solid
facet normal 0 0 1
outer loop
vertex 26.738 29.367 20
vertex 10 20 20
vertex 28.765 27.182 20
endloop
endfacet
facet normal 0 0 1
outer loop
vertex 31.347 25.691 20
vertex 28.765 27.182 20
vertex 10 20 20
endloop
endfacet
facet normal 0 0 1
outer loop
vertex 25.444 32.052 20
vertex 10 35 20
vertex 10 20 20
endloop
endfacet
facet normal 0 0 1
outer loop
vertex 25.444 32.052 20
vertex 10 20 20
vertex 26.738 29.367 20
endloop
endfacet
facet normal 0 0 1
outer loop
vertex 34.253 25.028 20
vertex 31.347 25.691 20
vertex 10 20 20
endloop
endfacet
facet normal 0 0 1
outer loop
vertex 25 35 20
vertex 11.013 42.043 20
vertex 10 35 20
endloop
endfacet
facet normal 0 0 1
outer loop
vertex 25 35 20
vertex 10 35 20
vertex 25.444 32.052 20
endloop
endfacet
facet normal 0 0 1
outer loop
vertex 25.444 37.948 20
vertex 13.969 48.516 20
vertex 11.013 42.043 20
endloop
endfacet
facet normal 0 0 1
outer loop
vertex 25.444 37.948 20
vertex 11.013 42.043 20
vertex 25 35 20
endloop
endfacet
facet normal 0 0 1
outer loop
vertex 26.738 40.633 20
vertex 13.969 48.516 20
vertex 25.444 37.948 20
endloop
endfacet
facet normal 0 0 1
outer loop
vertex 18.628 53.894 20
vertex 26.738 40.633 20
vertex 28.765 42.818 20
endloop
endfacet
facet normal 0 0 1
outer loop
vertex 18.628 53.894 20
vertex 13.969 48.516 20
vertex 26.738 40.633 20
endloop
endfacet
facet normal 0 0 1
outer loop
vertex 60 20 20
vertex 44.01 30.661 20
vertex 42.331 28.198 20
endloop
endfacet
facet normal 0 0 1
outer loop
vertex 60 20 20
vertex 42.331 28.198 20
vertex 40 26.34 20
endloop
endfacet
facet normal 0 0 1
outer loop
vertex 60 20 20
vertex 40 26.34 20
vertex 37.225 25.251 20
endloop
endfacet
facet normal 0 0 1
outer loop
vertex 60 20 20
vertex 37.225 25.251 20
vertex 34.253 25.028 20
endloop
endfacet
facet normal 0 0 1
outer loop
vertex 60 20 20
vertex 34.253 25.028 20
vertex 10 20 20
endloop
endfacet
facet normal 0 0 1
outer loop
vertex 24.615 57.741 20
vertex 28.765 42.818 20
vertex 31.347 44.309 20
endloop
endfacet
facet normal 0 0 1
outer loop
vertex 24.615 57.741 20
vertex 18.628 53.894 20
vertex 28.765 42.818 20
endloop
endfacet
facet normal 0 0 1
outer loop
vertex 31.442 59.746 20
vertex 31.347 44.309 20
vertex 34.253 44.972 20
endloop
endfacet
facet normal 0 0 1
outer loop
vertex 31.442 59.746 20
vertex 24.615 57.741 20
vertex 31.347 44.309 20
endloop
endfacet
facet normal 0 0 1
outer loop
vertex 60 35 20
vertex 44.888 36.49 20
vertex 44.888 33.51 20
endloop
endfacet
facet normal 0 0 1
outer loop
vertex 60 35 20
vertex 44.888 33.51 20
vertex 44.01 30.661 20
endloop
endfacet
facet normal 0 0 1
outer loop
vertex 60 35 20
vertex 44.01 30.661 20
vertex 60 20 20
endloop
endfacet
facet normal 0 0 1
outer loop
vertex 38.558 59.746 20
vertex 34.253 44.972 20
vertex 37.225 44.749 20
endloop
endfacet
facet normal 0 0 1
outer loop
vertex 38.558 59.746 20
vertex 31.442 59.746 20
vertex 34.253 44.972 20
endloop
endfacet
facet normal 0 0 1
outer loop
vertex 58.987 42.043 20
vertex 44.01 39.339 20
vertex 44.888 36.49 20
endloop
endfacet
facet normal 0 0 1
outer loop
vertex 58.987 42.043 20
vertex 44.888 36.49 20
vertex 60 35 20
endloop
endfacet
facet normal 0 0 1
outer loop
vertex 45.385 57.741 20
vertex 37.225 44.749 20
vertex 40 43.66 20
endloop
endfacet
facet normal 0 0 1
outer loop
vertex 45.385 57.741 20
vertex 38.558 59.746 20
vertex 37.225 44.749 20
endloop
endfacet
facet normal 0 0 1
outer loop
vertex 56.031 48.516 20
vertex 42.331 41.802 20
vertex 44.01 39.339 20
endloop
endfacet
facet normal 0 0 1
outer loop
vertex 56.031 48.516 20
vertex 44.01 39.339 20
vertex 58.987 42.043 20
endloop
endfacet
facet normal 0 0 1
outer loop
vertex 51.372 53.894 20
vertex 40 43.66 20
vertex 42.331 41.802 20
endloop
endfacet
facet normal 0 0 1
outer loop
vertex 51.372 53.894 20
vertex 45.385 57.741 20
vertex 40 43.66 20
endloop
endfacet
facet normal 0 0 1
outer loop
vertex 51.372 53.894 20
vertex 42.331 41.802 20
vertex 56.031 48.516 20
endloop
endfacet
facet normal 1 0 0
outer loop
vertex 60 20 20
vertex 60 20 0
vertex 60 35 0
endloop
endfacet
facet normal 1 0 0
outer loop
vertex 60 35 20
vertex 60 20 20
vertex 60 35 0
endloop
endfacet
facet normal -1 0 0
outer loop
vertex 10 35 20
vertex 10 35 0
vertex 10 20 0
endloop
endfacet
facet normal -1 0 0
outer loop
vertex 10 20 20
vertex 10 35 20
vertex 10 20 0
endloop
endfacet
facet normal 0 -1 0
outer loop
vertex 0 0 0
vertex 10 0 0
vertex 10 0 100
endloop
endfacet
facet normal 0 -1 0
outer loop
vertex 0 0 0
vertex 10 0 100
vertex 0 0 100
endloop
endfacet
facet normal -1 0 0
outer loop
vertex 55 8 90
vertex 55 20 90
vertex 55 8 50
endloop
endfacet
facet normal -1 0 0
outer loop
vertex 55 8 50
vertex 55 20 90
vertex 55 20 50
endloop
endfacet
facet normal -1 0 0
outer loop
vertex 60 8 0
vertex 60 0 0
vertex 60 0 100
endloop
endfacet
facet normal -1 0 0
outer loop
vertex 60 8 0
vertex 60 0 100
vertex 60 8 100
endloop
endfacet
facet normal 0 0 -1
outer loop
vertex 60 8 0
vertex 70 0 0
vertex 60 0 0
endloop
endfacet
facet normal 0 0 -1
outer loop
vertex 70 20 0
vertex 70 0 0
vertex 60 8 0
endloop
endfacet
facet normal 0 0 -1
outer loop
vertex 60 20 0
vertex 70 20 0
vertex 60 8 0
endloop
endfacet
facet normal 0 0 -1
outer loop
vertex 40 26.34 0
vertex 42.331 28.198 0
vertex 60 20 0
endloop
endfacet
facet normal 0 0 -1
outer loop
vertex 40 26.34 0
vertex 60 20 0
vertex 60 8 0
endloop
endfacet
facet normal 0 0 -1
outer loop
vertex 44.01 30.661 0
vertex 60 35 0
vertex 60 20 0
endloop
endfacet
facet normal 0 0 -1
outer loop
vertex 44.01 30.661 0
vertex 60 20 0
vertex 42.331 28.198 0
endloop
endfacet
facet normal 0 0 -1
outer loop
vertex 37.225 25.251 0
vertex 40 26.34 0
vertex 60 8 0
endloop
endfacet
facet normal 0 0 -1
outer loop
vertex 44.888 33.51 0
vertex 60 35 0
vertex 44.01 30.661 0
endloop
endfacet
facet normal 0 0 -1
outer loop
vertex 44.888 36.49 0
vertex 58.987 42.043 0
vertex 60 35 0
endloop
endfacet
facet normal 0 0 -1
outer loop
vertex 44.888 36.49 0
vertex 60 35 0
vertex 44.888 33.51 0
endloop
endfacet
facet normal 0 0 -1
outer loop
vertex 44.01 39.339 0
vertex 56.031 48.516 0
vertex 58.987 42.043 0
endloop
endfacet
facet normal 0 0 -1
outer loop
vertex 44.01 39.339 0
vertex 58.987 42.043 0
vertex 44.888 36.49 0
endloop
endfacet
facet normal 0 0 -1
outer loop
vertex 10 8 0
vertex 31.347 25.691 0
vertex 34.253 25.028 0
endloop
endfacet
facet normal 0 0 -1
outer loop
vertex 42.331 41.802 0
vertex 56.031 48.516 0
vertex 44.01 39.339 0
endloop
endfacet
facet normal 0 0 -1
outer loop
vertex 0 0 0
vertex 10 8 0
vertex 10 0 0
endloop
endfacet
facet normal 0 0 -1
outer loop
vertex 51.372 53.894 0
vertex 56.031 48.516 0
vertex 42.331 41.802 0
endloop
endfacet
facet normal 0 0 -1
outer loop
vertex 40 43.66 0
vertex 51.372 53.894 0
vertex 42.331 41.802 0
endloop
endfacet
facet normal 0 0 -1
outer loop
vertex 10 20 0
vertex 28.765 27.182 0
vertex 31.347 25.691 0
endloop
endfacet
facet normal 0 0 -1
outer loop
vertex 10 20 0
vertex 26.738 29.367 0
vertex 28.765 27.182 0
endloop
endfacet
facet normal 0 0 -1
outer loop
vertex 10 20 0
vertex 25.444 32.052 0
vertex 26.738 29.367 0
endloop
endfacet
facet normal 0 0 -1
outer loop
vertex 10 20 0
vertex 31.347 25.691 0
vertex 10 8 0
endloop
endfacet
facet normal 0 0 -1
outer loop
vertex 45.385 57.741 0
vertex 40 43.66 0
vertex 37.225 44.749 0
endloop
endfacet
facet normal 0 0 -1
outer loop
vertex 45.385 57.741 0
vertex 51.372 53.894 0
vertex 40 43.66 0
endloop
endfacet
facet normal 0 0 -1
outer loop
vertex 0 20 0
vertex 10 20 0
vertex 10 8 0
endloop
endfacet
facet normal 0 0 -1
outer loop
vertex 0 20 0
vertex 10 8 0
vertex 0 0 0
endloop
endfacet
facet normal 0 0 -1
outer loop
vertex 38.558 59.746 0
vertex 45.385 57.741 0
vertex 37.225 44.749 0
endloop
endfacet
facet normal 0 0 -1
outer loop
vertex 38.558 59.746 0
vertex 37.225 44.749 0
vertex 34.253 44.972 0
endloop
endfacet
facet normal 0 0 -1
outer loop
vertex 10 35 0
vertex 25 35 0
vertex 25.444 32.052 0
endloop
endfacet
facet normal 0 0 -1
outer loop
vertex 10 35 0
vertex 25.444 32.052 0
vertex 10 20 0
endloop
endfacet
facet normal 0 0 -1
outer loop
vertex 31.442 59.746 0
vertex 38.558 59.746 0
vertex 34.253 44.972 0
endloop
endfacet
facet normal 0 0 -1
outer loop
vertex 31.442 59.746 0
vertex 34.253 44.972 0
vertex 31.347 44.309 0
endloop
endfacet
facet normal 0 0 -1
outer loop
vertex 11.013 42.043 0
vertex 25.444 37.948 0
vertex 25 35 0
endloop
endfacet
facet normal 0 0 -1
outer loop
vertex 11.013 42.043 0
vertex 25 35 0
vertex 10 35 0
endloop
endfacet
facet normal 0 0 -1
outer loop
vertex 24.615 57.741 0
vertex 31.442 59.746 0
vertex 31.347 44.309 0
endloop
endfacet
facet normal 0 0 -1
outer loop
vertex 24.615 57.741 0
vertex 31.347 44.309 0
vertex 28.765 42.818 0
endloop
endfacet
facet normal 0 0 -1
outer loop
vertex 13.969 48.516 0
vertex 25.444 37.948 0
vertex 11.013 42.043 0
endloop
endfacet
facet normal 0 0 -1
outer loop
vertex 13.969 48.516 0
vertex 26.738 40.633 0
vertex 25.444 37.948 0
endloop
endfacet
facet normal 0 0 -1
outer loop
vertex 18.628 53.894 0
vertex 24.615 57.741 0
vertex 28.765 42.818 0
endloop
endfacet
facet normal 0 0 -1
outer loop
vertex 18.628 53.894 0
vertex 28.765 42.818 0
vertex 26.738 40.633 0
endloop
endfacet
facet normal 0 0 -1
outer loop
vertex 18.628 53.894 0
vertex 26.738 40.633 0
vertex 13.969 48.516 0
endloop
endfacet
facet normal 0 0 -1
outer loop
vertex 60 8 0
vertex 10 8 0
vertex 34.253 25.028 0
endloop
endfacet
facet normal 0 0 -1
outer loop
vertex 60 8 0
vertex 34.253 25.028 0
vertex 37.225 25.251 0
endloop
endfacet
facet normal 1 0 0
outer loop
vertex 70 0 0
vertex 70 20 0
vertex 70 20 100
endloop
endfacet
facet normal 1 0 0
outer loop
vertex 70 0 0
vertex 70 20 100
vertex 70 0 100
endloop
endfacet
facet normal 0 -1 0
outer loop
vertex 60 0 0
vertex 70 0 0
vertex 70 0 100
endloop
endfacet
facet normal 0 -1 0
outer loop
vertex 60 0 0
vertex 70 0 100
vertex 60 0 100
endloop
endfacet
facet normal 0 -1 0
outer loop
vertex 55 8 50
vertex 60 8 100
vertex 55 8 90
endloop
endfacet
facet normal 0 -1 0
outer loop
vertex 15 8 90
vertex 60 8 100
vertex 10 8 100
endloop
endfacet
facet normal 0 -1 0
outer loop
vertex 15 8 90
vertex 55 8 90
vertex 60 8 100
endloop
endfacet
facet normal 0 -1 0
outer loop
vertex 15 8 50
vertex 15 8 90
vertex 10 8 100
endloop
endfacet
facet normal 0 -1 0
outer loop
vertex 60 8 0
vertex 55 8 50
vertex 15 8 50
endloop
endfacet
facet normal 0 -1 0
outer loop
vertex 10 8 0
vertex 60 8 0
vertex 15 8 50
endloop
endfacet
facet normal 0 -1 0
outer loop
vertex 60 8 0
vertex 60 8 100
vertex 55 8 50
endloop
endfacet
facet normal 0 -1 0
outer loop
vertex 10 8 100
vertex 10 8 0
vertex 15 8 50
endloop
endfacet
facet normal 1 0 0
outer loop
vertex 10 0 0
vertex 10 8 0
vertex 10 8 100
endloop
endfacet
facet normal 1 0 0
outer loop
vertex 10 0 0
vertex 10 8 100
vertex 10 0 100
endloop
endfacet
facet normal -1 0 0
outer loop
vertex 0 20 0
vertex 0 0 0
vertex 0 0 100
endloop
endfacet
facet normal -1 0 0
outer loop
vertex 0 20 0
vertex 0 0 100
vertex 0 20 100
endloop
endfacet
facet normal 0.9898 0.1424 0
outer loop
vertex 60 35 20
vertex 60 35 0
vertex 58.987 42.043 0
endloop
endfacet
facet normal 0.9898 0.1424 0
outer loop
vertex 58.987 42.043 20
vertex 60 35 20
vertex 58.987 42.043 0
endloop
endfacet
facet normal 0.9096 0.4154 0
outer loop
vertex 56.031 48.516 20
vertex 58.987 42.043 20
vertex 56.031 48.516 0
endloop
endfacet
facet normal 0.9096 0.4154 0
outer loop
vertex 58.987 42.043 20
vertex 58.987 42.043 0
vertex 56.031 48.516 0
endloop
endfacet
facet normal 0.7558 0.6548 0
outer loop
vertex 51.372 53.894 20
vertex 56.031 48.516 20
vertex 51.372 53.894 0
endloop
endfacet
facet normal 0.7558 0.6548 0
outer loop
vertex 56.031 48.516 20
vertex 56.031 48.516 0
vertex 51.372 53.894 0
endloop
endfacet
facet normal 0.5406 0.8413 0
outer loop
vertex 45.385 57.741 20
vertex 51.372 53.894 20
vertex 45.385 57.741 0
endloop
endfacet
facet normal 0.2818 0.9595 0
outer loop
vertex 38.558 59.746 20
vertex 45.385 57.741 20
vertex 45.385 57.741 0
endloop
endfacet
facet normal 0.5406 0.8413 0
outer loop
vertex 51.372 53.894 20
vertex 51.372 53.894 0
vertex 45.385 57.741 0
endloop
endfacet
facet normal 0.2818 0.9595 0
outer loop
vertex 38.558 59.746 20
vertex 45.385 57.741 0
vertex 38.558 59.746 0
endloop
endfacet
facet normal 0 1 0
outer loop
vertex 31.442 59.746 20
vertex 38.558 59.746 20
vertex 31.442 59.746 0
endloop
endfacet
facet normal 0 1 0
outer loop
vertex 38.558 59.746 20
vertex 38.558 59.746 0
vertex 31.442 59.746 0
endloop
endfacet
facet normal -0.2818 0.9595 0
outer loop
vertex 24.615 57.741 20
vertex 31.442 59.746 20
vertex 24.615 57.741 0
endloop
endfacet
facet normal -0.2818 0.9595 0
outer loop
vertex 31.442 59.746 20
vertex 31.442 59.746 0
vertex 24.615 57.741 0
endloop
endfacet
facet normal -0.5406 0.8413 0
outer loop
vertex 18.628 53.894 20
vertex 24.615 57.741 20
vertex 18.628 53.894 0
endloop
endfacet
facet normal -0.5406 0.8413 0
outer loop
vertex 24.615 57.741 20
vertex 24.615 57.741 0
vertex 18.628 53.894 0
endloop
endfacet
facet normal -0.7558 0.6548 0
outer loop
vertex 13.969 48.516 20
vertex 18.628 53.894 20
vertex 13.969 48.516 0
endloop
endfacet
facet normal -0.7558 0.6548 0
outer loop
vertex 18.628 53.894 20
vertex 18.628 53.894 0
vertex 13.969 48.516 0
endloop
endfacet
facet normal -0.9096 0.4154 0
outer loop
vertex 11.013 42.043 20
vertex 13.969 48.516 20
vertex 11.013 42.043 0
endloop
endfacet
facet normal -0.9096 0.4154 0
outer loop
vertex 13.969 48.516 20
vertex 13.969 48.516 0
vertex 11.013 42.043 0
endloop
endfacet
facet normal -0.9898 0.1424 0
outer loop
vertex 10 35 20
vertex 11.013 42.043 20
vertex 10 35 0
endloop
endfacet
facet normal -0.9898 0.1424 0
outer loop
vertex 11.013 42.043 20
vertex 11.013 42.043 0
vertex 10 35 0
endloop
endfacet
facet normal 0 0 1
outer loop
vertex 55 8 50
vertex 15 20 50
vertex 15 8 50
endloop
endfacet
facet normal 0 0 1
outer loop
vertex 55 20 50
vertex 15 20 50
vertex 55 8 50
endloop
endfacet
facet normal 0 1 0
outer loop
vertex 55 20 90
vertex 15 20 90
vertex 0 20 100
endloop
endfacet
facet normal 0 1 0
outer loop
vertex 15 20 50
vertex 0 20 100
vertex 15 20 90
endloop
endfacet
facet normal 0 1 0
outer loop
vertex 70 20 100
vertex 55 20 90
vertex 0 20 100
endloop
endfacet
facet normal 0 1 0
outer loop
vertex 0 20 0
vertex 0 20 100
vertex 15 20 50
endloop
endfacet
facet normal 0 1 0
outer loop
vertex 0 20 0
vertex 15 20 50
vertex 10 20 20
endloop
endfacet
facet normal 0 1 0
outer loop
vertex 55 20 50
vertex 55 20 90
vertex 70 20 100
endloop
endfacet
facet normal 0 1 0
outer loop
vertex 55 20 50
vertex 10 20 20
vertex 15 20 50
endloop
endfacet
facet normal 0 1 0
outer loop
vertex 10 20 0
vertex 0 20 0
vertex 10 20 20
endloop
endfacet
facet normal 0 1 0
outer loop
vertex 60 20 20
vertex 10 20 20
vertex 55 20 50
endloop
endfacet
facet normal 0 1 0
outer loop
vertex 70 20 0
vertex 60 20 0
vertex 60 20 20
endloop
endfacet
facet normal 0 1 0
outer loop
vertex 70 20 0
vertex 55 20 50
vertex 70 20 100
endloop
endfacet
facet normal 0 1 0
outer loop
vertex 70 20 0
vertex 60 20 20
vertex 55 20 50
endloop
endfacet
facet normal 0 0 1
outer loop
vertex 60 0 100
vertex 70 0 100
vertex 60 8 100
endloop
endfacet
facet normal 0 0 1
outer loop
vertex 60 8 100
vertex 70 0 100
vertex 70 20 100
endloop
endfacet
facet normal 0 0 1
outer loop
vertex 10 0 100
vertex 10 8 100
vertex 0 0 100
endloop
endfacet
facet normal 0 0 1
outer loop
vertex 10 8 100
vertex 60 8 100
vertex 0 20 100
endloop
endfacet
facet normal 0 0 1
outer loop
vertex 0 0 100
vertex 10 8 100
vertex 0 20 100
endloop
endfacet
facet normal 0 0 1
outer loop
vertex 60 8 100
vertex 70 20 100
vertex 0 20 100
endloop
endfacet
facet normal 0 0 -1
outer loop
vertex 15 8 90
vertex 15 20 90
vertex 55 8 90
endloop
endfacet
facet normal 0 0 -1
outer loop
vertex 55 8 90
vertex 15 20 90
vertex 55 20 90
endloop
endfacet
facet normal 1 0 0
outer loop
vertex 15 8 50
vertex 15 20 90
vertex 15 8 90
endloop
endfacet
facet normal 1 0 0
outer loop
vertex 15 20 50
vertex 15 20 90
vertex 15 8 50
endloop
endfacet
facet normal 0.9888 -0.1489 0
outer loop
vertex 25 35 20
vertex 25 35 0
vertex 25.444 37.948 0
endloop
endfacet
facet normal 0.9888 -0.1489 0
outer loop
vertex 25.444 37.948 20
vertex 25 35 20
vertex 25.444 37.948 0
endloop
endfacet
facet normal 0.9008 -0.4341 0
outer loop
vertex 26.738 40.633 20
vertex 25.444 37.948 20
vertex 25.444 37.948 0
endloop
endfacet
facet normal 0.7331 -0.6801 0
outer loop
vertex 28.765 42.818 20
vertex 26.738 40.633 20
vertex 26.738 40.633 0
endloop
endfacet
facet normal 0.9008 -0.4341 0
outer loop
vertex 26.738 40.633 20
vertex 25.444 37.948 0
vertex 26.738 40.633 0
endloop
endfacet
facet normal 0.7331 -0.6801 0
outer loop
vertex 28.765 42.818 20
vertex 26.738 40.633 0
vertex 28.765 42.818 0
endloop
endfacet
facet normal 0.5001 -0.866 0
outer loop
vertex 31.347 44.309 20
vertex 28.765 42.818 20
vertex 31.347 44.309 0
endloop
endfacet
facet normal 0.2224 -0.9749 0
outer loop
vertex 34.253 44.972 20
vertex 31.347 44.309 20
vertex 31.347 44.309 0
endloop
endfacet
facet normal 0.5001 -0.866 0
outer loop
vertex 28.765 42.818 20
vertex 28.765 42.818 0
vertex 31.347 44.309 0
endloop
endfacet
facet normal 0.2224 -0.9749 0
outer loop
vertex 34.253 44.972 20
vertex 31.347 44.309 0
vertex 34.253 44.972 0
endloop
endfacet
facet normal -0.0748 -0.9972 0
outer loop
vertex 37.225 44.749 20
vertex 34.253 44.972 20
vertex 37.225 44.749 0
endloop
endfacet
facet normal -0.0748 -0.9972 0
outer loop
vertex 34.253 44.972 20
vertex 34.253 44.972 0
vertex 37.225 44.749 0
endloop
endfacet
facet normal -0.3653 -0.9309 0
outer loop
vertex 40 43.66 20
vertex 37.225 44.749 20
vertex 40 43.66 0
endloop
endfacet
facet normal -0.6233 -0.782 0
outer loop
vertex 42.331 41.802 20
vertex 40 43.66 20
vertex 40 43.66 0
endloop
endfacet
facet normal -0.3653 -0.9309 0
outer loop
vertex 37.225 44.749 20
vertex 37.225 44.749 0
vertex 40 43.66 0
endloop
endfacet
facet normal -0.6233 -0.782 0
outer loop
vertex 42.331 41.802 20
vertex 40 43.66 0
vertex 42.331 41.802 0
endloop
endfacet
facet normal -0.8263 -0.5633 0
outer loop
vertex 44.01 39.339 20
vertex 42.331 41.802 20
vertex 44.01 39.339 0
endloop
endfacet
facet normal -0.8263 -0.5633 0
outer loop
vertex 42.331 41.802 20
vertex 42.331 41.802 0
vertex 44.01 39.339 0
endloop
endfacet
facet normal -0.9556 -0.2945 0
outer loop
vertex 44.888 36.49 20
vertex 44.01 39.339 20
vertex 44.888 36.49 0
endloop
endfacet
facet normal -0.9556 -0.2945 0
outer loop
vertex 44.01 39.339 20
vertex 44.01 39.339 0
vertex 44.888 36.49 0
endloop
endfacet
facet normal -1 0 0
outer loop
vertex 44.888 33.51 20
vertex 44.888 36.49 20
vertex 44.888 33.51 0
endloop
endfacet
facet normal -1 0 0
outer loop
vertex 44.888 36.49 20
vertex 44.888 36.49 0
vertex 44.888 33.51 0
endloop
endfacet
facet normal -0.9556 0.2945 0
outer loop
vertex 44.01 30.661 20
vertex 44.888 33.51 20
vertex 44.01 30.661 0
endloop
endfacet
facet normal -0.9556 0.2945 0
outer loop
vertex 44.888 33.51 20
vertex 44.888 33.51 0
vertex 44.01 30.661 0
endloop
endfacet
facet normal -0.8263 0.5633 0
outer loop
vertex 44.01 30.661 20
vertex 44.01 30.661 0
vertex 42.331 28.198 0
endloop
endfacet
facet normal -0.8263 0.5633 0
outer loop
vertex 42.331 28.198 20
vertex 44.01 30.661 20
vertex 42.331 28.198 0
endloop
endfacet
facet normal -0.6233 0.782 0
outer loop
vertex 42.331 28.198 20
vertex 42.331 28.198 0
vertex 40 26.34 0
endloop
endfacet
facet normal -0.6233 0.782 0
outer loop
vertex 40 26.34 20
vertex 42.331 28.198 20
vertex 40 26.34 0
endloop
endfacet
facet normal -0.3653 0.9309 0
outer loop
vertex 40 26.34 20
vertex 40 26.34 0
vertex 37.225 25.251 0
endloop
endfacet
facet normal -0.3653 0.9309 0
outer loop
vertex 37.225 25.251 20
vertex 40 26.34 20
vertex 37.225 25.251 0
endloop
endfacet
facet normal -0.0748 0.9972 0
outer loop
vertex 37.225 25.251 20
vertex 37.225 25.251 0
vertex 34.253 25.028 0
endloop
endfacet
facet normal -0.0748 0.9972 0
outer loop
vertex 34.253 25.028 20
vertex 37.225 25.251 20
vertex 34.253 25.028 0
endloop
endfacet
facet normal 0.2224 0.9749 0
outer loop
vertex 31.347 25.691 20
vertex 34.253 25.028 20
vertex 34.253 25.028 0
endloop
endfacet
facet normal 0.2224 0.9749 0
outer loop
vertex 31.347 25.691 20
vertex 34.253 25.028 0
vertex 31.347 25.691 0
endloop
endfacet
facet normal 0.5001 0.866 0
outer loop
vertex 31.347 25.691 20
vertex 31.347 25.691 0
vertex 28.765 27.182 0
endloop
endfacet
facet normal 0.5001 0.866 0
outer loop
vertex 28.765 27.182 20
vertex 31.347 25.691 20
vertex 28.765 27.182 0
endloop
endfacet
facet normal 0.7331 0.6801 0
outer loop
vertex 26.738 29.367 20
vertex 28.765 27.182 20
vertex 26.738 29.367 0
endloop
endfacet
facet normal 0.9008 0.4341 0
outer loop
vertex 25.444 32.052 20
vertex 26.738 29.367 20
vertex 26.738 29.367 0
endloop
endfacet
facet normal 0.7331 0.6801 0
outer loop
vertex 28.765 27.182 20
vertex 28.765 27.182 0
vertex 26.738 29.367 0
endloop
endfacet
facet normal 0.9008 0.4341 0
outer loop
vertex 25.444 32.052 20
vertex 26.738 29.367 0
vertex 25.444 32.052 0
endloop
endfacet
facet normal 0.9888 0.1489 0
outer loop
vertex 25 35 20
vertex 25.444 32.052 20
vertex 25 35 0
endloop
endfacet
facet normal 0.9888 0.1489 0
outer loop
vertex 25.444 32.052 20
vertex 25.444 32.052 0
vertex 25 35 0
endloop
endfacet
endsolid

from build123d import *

# Parameters (mm, degrees)
EXTRUDE_1_DEPTH     = 100
SKETCH_3_R          = 10
EXTRUDE_2_DEPTH     = 20
SKETCH_4_W          = 40
SKETCH_4_H          = 40
CUT_EXTRUDE_1_DEPTH = 12


with BuildPart() as part:
    # Эскиз1 → Бобышка-Вытянуть1 (new body)
    with BuildSketch(Plane.XY):
        Polygon((0, 0), (0, 20), (70, 20), (70, 0), (60, 0), (60, 8), (10, 8), (10, 0), align=None)
    extrude(amount=EXTRUDE_1_DEPTH)

    # Эскиз3 → Бобышка-Вытянуть2 (add)
    with BuildSketch(Plane(origin=(0, 0, 0), x_dir=(-1, 0, 0), z_dir=(0, 0, -1))):
        with BuildLine():
            Line((-60, 20), (-60, 35))
            ThreePointArc((-60, 35), (-35, 60), (-10, 35))
            Line((-10, 35), (-10, 20))
            Line((-10, 20), (-60, 20))
        make_face()
        with Locations((-35, 35)):
            Circle(SKETCH_3_R, mode=Mode.SUBTRACT)
    extrude(amount=-EXTRUDE_2_DEPTH)

    # Эскиз4 → Вырез-Вытянуть1 (cut)
    with BuildSketch(Plane(origin=(0, 20, 0), x_dir=(1, 0, 0), z_dir=(0, 1, 0))):
        with Locations((35, -70)):
            Rectangle(SKETCH_4_W, SKETCH_4_H)
    extrude(amount=-CUT_EXTRUDE_1_DEPTH, mode=Mode.SUBTRACT)


solid = part.part
